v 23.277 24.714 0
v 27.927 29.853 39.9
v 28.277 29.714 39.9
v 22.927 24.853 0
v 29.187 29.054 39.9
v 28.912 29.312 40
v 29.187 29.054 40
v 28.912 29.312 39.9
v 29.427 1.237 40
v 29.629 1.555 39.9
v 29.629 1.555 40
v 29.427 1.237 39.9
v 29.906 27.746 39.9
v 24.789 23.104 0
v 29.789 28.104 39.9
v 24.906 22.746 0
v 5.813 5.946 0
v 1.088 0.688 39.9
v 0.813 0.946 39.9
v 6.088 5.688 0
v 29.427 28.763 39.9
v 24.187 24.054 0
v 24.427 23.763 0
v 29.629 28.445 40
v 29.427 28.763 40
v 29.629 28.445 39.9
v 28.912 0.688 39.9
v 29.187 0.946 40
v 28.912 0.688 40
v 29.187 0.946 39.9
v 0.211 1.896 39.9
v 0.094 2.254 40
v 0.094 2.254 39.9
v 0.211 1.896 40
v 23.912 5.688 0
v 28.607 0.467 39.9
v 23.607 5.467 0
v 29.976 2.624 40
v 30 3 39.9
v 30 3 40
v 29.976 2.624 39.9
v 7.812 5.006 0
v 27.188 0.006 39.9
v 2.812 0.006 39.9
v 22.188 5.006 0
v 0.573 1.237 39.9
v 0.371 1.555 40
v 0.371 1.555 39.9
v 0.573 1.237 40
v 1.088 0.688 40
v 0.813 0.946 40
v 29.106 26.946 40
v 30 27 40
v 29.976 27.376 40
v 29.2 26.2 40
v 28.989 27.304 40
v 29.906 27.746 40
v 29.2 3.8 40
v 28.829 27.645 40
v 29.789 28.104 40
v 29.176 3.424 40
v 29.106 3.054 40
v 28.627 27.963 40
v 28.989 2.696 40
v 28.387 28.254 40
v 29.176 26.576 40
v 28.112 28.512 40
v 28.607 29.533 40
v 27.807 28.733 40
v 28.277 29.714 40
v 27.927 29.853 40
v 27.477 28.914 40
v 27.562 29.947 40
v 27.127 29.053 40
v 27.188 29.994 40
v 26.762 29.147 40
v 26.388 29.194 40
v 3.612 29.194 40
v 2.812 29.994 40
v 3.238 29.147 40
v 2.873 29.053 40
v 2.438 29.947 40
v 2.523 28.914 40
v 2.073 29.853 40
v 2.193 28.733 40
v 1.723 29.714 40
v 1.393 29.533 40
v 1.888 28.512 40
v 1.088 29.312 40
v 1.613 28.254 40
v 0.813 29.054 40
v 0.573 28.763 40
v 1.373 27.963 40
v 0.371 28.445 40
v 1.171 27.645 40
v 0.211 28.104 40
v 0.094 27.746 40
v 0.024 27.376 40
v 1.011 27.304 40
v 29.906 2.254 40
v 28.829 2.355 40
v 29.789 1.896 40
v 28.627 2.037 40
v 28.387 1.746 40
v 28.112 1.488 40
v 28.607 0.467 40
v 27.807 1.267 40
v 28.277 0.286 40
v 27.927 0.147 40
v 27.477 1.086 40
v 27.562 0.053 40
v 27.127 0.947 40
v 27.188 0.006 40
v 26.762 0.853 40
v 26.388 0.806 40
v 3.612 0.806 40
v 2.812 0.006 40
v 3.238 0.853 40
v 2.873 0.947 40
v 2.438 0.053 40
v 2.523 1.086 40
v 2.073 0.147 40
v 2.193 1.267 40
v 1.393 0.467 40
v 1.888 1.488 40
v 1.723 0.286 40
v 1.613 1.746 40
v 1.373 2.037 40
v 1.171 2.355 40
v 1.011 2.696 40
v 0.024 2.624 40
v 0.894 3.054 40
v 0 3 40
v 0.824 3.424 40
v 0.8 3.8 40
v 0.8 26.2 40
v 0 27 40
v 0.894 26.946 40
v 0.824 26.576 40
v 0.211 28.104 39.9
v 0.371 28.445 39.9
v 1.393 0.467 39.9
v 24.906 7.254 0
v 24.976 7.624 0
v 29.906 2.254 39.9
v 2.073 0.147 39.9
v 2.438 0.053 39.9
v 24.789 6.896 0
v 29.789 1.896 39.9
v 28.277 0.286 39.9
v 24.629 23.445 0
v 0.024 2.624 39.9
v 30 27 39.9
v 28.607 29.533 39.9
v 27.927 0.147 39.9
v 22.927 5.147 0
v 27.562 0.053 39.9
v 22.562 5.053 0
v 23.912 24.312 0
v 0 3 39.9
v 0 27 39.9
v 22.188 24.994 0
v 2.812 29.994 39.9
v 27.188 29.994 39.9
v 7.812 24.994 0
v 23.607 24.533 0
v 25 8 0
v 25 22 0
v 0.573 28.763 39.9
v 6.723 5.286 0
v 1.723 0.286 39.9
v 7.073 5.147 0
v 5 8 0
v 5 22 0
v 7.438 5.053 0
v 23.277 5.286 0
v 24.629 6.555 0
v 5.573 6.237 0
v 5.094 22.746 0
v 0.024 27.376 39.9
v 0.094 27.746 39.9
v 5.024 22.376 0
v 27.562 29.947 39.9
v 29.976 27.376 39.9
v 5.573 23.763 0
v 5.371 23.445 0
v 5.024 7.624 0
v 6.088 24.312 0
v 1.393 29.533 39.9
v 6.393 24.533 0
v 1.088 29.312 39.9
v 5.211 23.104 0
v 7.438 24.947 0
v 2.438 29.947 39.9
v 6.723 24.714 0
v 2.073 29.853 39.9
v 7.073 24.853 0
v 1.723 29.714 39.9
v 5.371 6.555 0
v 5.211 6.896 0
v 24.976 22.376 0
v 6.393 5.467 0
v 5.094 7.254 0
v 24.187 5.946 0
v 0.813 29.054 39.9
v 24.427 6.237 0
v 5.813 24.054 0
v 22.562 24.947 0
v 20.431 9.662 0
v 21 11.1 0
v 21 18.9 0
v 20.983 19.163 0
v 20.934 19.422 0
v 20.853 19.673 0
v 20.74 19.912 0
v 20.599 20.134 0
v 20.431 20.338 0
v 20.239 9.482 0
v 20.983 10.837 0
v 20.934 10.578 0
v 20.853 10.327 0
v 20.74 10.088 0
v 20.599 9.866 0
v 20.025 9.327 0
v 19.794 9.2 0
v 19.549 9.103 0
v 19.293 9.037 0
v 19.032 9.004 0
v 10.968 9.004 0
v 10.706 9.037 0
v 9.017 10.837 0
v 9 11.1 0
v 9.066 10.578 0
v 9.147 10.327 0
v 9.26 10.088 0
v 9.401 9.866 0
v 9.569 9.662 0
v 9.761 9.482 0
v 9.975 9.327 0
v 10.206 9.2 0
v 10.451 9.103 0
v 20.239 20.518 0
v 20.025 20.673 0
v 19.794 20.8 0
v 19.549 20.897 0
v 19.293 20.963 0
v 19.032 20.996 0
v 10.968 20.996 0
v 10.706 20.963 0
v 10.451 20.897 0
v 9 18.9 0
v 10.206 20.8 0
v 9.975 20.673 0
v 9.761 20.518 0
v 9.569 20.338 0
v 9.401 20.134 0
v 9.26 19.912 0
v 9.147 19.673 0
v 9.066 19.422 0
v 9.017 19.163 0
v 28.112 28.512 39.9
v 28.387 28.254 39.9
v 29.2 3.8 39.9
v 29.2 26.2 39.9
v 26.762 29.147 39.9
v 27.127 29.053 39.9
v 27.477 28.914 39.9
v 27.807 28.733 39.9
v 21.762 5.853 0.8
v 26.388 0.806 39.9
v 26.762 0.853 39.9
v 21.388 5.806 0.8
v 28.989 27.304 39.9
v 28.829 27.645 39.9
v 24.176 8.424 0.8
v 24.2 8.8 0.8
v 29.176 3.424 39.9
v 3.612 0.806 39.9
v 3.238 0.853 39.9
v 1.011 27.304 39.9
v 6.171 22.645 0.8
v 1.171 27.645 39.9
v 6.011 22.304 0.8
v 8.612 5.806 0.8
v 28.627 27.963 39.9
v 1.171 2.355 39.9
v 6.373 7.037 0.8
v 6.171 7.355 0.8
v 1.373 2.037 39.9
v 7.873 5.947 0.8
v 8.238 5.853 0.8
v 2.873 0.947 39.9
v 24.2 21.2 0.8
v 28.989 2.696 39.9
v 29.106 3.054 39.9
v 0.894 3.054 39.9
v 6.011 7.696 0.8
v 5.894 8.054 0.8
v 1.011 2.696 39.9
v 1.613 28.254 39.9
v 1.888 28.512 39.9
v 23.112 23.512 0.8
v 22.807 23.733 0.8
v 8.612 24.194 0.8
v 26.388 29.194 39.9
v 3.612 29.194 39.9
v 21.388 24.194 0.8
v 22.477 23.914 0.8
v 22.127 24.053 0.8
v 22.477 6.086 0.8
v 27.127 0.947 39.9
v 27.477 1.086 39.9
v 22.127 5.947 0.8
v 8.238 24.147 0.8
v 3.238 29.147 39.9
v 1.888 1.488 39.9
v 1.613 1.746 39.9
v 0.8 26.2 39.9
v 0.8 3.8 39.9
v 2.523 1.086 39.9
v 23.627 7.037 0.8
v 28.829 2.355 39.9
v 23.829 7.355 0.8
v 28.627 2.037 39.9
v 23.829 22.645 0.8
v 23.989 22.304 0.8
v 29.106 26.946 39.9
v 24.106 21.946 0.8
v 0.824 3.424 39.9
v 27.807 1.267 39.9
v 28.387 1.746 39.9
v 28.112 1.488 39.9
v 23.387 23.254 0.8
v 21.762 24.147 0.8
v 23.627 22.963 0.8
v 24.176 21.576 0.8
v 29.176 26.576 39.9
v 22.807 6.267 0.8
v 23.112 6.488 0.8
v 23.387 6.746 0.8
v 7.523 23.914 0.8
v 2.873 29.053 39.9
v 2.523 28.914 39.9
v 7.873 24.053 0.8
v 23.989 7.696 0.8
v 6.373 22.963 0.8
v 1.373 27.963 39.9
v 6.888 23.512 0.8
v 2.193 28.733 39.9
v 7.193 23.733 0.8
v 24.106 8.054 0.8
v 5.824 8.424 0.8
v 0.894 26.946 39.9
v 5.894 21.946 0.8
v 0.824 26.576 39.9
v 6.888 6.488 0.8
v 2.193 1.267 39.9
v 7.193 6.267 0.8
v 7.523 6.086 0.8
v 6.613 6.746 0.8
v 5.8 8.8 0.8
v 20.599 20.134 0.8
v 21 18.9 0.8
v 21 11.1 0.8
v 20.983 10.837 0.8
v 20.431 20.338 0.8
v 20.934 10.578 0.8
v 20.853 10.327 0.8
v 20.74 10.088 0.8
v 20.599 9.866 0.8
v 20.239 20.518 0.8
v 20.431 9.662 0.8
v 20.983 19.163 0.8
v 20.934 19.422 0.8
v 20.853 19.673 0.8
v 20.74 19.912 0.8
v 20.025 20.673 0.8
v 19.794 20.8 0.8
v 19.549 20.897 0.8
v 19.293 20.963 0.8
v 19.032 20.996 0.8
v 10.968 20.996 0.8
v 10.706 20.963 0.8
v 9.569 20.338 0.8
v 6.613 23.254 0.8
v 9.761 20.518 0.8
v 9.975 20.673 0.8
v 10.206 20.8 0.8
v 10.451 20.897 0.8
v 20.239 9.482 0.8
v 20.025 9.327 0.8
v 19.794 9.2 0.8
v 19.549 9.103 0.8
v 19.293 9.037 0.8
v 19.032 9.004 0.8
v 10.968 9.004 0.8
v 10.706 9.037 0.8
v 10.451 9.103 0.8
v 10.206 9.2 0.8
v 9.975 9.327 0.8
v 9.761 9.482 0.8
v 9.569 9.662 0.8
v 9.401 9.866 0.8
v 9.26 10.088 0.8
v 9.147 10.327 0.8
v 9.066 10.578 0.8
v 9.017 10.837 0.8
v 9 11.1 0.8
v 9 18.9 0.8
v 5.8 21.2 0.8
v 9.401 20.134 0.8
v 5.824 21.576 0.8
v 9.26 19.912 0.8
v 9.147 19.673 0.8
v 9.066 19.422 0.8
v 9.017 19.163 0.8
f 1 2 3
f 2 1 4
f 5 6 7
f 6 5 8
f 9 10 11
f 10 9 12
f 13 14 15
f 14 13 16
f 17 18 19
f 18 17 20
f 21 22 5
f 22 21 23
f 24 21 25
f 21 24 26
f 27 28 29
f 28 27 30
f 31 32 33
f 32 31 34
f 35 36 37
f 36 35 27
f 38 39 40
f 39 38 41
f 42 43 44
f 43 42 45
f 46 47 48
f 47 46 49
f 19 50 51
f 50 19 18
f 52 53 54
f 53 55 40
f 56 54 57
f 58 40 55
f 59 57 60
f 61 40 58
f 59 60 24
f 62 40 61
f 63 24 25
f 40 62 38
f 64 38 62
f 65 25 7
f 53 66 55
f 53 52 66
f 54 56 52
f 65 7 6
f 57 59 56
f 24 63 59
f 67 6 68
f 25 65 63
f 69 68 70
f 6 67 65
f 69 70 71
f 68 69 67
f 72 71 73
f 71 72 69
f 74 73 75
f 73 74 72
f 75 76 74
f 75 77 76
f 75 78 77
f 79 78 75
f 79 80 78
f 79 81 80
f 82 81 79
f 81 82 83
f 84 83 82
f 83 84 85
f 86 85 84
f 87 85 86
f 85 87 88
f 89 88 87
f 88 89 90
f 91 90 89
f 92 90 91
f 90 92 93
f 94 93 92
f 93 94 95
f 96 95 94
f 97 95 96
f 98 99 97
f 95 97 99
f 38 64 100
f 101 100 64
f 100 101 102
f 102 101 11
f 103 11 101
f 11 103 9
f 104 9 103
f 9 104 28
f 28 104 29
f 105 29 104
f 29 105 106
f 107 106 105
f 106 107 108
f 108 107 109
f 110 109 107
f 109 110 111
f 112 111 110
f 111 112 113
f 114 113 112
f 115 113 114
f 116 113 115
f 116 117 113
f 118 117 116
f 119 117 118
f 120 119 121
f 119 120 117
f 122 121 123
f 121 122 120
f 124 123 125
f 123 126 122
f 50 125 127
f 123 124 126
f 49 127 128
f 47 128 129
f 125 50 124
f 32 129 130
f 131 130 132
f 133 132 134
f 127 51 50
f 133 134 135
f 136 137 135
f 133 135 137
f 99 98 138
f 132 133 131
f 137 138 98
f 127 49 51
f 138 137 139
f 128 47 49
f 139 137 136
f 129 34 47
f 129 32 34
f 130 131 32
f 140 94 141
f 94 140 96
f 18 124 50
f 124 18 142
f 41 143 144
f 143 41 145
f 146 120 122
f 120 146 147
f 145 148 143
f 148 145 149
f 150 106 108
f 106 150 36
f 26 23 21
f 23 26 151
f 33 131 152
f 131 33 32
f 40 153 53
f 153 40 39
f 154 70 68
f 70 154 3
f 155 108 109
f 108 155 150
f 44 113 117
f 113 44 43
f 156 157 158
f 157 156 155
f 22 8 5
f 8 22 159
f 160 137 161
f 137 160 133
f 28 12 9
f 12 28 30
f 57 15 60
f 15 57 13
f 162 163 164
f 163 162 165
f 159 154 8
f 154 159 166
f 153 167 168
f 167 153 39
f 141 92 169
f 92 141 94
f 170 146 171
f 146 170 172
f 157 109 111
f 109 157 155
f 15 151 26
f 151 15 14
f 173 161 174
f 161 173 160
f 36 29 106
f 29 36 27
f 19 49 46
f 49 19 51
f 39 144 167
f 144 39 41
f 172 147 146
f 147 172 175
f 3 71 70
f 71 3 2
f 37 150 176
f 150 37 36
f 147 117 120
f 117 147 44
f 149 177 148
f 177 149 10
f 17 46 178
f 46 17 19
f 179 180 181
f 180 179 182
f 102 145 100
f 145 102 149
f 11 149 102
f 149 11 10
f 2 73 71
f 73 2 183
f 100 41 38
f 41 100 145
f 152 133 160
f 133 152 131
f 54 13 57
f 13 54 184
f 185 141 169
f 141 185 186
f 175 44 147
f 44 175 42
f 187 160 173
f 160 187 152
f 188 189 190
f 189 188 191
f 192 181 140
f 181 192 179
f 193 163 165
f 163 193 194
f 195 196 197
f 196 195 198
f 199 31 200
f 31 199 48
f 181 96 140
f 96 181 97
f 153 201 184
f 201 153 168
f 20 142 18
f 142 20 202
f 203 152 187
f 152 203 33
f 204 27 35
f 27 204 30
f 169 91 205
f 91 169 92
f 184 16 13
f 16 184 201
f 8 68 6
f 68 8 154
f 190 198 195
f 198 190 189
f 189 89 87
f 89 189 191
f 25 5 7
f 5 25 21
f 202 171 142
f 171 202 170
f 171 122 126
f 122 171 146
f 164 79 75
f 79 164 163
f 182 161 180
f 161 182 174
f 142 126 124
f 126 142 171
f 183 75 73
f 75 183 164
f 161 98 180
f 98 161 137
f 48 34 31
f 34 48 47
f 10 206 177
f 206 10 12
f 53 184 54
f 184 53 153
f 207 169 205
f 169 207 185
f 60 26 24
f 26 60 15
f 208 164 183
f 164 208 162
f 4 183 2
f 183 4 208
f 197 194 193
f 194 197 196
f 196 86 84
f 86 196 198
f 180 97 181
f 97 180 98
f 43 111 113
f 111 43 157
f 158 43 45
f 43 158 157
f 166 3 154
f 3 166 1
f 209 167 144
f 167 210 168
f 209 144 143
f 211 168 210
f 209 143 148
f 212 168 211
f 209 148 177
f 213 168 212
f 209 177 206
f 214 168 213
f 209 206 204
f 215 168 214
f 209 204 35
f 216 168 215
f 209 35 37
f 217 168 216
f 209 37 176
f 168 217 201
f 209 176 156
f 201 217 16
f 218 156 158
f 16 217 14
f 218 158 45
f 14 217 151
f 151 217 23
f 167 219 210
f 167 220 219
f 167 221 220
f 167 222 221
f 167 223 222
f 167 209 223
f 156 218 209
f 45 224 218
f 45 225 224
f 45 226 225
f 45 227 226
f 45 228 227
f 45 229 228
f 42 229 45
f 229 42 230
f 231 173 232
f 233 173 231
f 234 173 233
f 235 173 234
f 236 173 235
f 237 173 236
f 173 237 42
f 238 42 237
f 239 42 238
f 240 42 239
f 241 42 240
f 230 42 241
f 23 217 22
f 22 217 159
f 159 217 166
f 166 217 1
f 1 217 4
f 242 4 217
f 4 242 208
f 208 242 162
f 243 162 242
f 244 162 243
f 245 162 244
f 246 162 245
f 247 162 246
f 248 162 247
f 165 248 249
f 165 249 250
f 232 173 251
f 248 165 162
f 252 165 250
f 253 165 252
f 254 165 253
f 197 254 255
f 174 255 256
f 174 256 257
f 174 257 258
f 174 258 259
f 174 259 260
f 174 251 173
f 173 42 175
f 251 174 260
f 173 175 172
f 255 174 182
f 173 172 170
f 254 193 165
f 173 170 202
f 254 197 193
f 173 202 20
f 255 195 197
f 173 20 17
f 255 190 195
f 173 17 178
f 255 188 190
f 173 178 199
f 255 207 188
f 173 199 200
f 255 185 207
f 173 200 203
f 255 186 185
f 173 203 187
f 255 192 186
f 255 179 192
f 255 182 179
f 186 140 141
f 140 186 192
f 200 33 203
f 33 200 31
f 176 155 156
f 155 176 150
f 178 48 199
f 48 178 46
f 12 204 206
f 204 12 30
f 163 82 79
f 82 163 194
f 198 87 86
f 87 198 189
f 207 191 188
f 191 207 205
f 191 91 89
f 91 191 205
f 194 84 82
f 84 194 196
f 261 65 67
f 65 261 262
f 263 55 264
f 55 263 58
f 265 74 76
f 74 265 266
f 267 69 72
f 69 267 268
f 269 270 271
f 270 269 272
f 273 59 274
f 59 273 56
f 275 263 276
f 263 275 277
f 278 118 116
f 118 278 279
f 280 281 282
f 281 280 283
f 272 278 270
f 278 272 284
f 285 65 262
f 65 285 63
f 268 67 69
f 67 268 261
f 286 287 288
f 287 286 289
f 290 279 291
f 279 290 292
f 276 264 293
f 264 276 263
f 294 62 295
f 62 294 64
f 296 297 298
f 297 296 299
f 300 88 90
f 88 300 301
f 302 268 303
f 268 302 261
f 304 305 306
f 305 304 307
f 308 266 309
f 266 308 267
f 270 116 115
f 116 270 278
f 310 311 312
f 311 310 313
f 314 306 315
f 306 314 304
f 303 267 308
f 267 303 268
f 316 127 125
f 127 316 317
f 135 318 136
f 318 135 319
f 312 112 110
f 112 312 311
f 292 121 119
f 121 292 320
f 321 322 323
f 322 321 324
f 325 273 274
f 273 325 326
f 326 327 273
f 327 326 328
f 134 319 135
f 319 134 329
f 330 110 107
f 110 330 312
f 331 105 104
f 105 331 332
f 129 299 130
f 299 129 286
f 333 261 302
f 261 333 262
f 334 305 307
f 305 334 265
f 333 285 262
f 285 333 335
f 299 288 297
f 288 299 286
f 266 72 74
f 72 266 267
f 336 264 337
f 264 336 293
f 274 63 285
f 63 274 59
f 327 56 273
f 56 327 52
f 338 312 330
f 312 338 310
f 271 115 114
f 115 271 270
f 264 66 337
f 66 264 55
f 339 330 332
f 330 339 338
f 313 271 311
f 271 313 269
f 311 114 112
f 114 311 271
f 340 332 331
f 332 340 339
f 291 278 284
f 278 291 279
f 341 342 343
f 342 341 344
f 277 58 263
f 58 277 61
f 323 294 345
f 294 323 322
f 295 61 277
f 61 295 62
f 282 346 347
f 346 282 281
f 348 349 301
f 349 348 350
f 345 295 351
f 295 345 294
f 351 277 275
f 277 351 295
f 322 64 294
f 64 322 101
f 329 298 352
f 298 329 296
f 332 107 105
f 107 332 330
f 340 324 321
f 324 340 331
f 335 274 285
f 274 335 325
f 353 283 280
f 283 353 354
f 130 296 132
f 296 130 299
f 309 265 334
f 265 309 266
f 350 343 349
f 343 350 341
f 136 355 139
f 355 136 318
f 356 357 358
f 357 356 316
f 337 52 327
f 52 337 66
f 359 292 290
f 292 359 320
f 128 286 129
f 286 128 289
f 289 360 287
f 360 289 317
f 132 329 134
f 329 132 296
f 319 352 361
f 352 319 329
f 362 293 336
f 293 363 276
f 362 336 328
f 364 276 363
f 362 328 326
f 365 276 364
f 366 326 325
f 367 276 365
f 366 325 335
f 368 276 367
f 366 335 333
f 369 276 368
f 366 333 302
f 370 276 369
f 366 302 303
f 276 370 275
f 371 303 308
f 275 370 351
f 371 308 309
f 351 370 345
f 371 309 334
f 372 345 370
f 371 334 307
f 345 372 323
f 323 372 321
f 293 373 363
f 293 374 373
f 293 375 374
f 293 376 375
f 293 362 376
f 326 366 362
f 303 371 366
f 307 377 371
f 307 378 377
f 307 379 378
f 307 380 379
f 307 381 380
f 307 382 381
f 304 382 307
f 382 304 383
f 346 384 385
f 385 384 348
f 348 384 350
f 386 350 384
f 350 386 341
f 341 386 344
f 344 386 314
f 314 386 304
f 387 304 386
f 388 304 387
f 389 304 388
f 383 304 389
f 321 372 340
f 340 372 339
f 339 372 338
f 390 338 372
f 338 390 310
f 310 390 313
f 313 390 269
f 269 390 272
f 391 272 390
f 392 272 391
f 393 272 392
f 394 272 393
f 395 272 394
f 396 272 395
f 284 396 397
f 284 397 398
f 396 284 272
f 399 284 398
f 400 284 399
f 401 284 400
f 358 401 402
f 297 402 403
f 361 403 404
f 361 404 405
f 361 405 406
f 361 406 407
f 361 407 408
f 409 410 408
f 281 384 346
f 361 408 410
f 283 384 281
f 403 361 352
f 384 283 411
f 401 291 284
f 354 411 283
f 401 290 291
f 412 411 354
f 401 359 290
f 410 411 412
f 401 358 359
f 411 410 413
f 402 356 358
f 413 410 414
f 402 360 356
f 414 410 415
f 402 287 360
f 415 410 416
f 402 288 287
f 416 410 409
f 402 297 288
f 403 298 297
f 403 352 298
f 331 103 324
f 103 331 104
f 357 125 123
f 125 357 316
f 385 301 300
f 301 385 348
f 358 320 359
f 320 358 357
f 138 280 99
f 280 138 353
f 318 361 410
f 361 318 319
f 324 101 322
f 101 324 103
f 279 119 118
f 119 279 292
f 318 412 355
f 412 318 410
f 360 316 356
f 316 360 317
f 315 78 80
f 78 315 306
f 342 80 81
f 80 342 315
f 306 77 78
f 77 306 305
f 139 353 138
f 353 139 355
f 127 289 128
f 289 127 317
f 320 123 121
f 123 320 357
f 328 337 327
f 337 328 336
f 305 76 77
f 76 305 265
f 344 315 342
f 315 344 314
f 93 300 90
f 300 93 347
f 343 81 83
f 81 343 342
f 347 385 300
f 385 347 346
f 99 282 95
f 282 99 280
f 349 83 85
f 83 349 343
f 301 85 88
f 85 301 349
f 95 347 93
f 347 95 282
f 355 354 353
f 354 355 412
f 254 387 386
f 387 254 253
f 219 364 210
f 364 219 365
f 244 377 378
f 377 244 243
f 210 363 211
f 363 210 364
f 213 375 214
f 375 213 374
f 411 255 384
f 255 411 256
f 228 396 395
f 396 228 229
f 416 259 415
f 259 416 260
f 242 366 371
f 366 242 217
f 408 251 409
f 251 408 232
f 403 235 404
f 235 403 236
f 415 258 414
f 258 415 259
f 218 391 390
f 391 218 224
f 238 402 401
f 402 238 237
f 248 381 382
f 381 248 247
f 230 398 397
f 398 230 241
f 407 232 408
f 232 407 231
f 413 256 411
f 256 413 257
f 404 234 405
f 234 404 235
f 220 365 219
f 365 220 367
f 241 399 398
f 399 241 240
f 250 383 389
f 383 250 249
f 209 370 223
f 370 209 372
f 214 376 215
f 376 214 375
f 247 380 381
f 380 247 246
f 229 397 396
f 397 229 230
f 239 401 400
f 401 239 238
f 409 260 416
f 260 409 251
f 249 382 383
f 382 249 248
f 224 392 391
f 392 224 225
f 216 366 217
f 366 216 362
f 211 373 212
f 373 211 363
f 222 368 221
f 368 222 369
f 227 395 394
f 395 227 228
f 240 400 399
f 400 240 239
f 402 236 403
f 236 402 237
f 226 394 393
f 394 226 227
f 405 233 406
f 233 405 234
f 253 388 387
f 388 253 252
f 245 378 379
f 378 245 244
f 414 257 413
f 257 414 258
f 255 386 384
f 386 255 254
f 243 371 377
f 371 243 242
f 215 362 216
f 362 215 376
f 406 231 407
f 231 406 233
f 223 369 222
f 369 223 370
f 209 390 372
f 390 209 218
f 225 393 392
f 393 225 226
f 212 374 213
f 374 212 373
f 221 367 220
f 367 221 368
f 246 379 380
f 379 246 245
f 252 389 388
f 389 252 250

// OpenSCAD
// This is a little rack that you can hang sprouting pots in.
// The specific pot dimentions in this file are currently designed to work with
// this pot:
//    https://www.thingiverse.com/thing:3449179
// Basically you can configure how many pots you want in your rack 
// and a few other qualities of the rack such as how big of risers you
// want under it to let water drip out.
// It works nicely with openscad in my experimentation.
//
// If you wanted to use a different sized pot it should be pretty easy as long
// as the pots are taper squares with rounded corners.  I've used it with a bigger
// pot I made and it worked great with them too.

$fn=50;  // Increase the smoothness for nice round curves

// Set the size of the grid (how many pots in your rack)
num_pots_x = 1;
num_pots_y = 1;

// How big of a gap between adjacent pots (the holes in the rack)
interpot_spacing_mm = 2;

// How big of an outer lip the rack has around the outerpost pots
rack_thickness_mm = 1;

// How far *below* the top lip of the pots the rack stops
rack_inset_depth_mm = 10;

// The dimensions of the cylindrical risers on the bottom of the rack 
riser_radius_mm = 8;
riser_height_mm = 16;

pot_wiggle_room_mm = 0.1;
pot_insert_wiggle_room_mm = 0.5;
drip_tray_groove_wiggle_room_mm = 1.0;

// The dimensions and characteristics of the pots
pot_wall_thickness_mm = 0.8;
pot_top_edge_mm = 30;
pot_bottom_edge_mm = 20;
pot_height_mm = 40;
pot_rounded_radius_mm = 3;
pot_drain_lip_mm = 8;
pot_drain_hole_rounded_radius_multiplier = 0.7;  // Use this to adust the curve in the drain hole

drip_tray_extra_space_around_rack_mm = 10;

// Computed dimensions of the rack -- derived from the values set above
rack_dim_x_mm = (pot_top_edge_mm + interpot_spacing_mm) * num_pots_x
                    - interpot_spacing_mm
                    + rack_thickness_mm * 2;
rack_dim_y_mm = (pot_top_edge_mm + interpot_spacing_mm) * num_pots_y
                    - interpot_spacing_mm
                    + rack_thickness_mm * 2;
rack_dim_z_mm = pot_height_mm - rack_inset_depth_mm;

module rounded_box(x_dimension_mm, y_dimension_mm, z_dimension_mm, radius_mm) {
    hull() {
        translate([radius_mm, radius_mm, 0])
            cylinder(h = z_dimension_mm,r = radius_mm);
        translate([x_dimension_mm - radius_mm, radius_mm, 0])
            cylinder(h = z_dimension_mm, r = radius_mm);
        translate([radius_mm, y_dimension_mm - radius_mm, 0])
            cylinder(h = z_dimension_mm, r = radius_mm);
        translate([x_dimension_mm-radius_mm, y_dimension_mm - radius_mm, 0])
            cylinder(h = z_dimension_mm, r = radius_mm);
    }
}

module pot(top_edge_mm, bottom_edge_mm) {
    slice_height_mm = 0.1;

    pot_inside_top_edge_mm = top_edge_mm - pot_wall_thickness_mm * 2;
    pot_inside_bottom_edge_mm = bottom_edge_mm - pot_wall_thickness_mm * 2;

    pot_bottom_edge_inset_mm = (top_edge_mm - bottom_edge_mm) / 2;
    pot_inside_bottom_edge_inset_mm = pot_bottom_edge_inset_mm + pot_wall_thickness_mm;

    drain_hole_size = bottom_edge_mm - pot_drain_lip_mm;
    drain_hole_inset_mm = (top_edge_mm - drain_hole_size) / 2;
    drain_hole_rounded_radius_mm = pot_rounded_radius_mm * pot_drain_hole_rounded_radius_multiplier;

    difference() {
        // The main pot body
        difference() {
            // The outside of the pot
            hull() {
                translate([0, 0, pot_height_mm - slice_height_mm])
                    rounded_box(top_edge_mm, top_edge_mm, slice_height_mm, pot_rounded_radius_mm);
                translate([pot_bottom_edge_inset_mm, pot_bottom_edge_inset_mm, 0])
                    rounded_box(bottom_edge_mm, bottom_edge_mm, slice_height_mm, pot_rounded_radius_mm);
            }

            // The inside of the pot
            hull() {
                translate([pot_wall_thickness_mm, pot_wall_thickness_mm, pot_height_mm - slice_height_mm])
                    rounded_box(pot_inside_top_edge_mm, pot_inside_top_edge_mm, slice_height_mm, pot_rounded_radius_mm);
                translate([pot_inside_bottom_edge_inset_mm, pot_inside_bottom_edge_inset_mm, pot_wall_thickness_mm])
                    rounded_box(pot_inside_bottom_edge_mm, pot_inside_bottom_edge_mm, slice_height_mm, pot_rounded_radius_mm);
            }
        }

        // The drain hole in the bottom
        translate([drain_hole_inset_mm, drain_hole_inset_mm, 0])
                rounded_box(drain_hole_size, drain_hole_size, pot_wall_thickness_mm, drain_hole_rounded_radius_mm);
    }
}

module pot_blank() {
    hull() {
        // The translate compensates for the added wiggle room size and keeps the resulting
        // pot centered in the same spot as the as it would've been without the wiggle room added
        translate([-pot_wiggle_room_mm / 2, -pot_wiggle_room_mm / 2, 0]) {
            pot(pot_top_edge_mm + pot_wiggle_room_mm, pot_bottom_edge_mm + pot_wiggle_room_mm);
        }
    }
}

module pot_insert() {
    pot_insert_edge_mm = pot_bottom_edge_mm - pot_wall_thickness_mm * 2 - pot_insert_wiggle_room_mm;

    drain_length_mm = pot_insert_edge_mm - pot_rounded_radius_mm * 3.5;
    drain_depth_mm = drain_length_mm / 3;

    insert_riser_height_mm = pot_wall_thickness_mm * 2;
    insert_riser_thickness_mm = drain_depth_mm / 2;

    // The main plate with drains cut out
    difference() {
        // The main plate that makes up the insert
        translate([-pot_insert_edge_mm / 2, -pot_insert_edge_mm / 2, -pot_wall_thickness_mm / 2])
            rounded_box(pot_insert_edge_mm, pot_insert_edge_mm, pot_wall_thickness_mm, pot_rounded_radius_mm);

        // The rectangular drains (one on each edge of the square)
        for (r = [0 : 90 : 270]) {
            rotate(r)
                translate([0, pot_insert_edge_mm / 2, 0])
                    cube([drain_length_mm, drain_depth_mm, pot_wall_thickness_mm], center = true);
        }
    }

    // Adding the risers
    translate([0, 0, insert_riser_height_mm / 2 + pot_wall_thickness_mm / 2]) {
        intersection() {
            translate([-pot_insert_edge_mm / 2, -pot_insert_edge_mm / 2, -insert_riser_height_mm / 2])
                rounded_box(pot_insert_edge_mm, pot_insert_edge_mm, insert_riser_height_mm, pot_rounded_radius_mm);
            for (r = [0 : 90 : 270]) {
                rotate(r) {
                    translate([pot_insert_edge_mm / 2, drain_length_mm / 2 + insert_riser_thickness_mm / 2, 0])
                        cube([pot_drain_lip_mm + 3, insert_riser_thickness_mm, insert_riser_height_mm], center = true);
                    translate([pot_insert_edge_mm / 2, -drain_length_mm / 2 - insert_riser_thickness_mm / 2, 0])
                        cube([pot_drain_lip_mm + 3, insert_riser_thickness_mm, insert_riser_height_mm], center = true);
                }
            }
        }
    }
}

module grid_of_pots() {
    for (x = [0 : num_pots_x - 1]) {
        for (y = [0 : num_pots_y - 1]) {
            x_offset = x * (pot_top_edge_mm + interpot_spacing_mm);
            y_offset = y * (pot_top_edge_mm + interpot_spacing_mm);
            translate([x_offset, y_offset, 0]) pot_blank();
        }
    }
}

module rack_blank() {
    translate([-rack_thickness_mm, -rack_thickness_mm, 0]) 
        rounded_box(rack_dim_x_mm, rack_dim_y_mm, rack_dim_z_mm, pot_rounded_radius_mm);
}

module rack_risers() {
    intersection() {
        for (x = [0 : num_pots_x]) {
            for (y = [0 : num_pots_y]) {
                x_offset = x * (pot_top_edge_mm + interpot_spacing_mm) - interpot_spacing_mm / 2;
                y_offset = y * (pot_top_edge_mm + interpot_spacing_mm) - interpot_spacing_mm / 2;

                translate([x_offset, y_offset, -riser_height_mm])
                    cylinder(h = riser_height_mm, r = riser_radius_mm);
            }
        }

        // Note it's scaled to stretch it comically long since we're really only trying
        // to intersect in x & y, no other reason
        translate([0, 0, -riser_height_mm]) scale([1, 1, 100]) rack_blank();
    }
}

module rack() {
    difference() {
        rack_blank();
        grid_of_pots();
    }
}

module rack_with_risers() {
    union() {
        rack();
        rack_risers();
    }
}

module drip_tray_without_groves() {
    inner_tray_dim_x_mm = rack_dim_x_mm + 2 * drip_tray_extra_space_around_rack_mm + drip_tray_groove_wiggle_room_mm;
    inner_tray_dim_y_mm = rack_dim_y_mm + 2 * drip_tray_extra_space_around_rack_mm + drip_tray_groove_wiggle_room_mm;
    inner_tray_depth_mm = riser_height_mm;

    tray_dim_x_mm = inner_tray_dim_x_mm + 2 * rack_thickness_mm;
    tray_dim_y_mm = inner_tray_dim_y_mm + 2 * rack_thickness_mm;
    tray_dim_z_mm = inner_tray_depth_mm + 2 * rack_thickness_mm;

    difference() {
        rounded_box(tray_dim_x_mm, tray_dim_y_mm, tray_dim_z_mm, pot_rounded_radius_mm);
        translate([rack_thickness_mm, rack_thickness_mm, 2 * rack_thickness_mm])
            rounded_box(inner_tray_dim_x_mm, inner_tray_dim_y_mm, inner_tray_depth_mm, pot_rounded_radius_mm);
    }
}

module drip_tray() {
    difference() {
        translate([-rack_thickness_mm - drip_tray_extra_space_around_rack_mm - drip_tray_groove_wiggle_room_mm / 2,
                   -rack_thickness_mm - drip_tray_extra_space_around_rack_mm - drip_tray_groove_wiggle_room_mm / 2,
                   -riser_height_mm - rack_thickness_mm])
            drip_tray_without_groves();

        translate([-drip_tray_groove_wiggle_room_mm / 2,
                   -drip_tray_groove_wiggle_room_mm / 2,
                   -riser_height_mm])
            rounded_box(rack_dim_x_mm + drip_tray_groove_wiggle_room_mm,
                        rack_dim_y_mm + drip_tray_groove_wiggle_room_mm,
                        rack_dim_z_mm,
                        pot_rounded_radius_mm);
    }
}


// Uncomment one of these at a time to render either the rack, the drip tray, a pot, or a pot insert
//rack_with_risers();
//drip_tray();
pot(pot_top_edge_mm, pot_bottom_edge_mm);
//pot_insert();
